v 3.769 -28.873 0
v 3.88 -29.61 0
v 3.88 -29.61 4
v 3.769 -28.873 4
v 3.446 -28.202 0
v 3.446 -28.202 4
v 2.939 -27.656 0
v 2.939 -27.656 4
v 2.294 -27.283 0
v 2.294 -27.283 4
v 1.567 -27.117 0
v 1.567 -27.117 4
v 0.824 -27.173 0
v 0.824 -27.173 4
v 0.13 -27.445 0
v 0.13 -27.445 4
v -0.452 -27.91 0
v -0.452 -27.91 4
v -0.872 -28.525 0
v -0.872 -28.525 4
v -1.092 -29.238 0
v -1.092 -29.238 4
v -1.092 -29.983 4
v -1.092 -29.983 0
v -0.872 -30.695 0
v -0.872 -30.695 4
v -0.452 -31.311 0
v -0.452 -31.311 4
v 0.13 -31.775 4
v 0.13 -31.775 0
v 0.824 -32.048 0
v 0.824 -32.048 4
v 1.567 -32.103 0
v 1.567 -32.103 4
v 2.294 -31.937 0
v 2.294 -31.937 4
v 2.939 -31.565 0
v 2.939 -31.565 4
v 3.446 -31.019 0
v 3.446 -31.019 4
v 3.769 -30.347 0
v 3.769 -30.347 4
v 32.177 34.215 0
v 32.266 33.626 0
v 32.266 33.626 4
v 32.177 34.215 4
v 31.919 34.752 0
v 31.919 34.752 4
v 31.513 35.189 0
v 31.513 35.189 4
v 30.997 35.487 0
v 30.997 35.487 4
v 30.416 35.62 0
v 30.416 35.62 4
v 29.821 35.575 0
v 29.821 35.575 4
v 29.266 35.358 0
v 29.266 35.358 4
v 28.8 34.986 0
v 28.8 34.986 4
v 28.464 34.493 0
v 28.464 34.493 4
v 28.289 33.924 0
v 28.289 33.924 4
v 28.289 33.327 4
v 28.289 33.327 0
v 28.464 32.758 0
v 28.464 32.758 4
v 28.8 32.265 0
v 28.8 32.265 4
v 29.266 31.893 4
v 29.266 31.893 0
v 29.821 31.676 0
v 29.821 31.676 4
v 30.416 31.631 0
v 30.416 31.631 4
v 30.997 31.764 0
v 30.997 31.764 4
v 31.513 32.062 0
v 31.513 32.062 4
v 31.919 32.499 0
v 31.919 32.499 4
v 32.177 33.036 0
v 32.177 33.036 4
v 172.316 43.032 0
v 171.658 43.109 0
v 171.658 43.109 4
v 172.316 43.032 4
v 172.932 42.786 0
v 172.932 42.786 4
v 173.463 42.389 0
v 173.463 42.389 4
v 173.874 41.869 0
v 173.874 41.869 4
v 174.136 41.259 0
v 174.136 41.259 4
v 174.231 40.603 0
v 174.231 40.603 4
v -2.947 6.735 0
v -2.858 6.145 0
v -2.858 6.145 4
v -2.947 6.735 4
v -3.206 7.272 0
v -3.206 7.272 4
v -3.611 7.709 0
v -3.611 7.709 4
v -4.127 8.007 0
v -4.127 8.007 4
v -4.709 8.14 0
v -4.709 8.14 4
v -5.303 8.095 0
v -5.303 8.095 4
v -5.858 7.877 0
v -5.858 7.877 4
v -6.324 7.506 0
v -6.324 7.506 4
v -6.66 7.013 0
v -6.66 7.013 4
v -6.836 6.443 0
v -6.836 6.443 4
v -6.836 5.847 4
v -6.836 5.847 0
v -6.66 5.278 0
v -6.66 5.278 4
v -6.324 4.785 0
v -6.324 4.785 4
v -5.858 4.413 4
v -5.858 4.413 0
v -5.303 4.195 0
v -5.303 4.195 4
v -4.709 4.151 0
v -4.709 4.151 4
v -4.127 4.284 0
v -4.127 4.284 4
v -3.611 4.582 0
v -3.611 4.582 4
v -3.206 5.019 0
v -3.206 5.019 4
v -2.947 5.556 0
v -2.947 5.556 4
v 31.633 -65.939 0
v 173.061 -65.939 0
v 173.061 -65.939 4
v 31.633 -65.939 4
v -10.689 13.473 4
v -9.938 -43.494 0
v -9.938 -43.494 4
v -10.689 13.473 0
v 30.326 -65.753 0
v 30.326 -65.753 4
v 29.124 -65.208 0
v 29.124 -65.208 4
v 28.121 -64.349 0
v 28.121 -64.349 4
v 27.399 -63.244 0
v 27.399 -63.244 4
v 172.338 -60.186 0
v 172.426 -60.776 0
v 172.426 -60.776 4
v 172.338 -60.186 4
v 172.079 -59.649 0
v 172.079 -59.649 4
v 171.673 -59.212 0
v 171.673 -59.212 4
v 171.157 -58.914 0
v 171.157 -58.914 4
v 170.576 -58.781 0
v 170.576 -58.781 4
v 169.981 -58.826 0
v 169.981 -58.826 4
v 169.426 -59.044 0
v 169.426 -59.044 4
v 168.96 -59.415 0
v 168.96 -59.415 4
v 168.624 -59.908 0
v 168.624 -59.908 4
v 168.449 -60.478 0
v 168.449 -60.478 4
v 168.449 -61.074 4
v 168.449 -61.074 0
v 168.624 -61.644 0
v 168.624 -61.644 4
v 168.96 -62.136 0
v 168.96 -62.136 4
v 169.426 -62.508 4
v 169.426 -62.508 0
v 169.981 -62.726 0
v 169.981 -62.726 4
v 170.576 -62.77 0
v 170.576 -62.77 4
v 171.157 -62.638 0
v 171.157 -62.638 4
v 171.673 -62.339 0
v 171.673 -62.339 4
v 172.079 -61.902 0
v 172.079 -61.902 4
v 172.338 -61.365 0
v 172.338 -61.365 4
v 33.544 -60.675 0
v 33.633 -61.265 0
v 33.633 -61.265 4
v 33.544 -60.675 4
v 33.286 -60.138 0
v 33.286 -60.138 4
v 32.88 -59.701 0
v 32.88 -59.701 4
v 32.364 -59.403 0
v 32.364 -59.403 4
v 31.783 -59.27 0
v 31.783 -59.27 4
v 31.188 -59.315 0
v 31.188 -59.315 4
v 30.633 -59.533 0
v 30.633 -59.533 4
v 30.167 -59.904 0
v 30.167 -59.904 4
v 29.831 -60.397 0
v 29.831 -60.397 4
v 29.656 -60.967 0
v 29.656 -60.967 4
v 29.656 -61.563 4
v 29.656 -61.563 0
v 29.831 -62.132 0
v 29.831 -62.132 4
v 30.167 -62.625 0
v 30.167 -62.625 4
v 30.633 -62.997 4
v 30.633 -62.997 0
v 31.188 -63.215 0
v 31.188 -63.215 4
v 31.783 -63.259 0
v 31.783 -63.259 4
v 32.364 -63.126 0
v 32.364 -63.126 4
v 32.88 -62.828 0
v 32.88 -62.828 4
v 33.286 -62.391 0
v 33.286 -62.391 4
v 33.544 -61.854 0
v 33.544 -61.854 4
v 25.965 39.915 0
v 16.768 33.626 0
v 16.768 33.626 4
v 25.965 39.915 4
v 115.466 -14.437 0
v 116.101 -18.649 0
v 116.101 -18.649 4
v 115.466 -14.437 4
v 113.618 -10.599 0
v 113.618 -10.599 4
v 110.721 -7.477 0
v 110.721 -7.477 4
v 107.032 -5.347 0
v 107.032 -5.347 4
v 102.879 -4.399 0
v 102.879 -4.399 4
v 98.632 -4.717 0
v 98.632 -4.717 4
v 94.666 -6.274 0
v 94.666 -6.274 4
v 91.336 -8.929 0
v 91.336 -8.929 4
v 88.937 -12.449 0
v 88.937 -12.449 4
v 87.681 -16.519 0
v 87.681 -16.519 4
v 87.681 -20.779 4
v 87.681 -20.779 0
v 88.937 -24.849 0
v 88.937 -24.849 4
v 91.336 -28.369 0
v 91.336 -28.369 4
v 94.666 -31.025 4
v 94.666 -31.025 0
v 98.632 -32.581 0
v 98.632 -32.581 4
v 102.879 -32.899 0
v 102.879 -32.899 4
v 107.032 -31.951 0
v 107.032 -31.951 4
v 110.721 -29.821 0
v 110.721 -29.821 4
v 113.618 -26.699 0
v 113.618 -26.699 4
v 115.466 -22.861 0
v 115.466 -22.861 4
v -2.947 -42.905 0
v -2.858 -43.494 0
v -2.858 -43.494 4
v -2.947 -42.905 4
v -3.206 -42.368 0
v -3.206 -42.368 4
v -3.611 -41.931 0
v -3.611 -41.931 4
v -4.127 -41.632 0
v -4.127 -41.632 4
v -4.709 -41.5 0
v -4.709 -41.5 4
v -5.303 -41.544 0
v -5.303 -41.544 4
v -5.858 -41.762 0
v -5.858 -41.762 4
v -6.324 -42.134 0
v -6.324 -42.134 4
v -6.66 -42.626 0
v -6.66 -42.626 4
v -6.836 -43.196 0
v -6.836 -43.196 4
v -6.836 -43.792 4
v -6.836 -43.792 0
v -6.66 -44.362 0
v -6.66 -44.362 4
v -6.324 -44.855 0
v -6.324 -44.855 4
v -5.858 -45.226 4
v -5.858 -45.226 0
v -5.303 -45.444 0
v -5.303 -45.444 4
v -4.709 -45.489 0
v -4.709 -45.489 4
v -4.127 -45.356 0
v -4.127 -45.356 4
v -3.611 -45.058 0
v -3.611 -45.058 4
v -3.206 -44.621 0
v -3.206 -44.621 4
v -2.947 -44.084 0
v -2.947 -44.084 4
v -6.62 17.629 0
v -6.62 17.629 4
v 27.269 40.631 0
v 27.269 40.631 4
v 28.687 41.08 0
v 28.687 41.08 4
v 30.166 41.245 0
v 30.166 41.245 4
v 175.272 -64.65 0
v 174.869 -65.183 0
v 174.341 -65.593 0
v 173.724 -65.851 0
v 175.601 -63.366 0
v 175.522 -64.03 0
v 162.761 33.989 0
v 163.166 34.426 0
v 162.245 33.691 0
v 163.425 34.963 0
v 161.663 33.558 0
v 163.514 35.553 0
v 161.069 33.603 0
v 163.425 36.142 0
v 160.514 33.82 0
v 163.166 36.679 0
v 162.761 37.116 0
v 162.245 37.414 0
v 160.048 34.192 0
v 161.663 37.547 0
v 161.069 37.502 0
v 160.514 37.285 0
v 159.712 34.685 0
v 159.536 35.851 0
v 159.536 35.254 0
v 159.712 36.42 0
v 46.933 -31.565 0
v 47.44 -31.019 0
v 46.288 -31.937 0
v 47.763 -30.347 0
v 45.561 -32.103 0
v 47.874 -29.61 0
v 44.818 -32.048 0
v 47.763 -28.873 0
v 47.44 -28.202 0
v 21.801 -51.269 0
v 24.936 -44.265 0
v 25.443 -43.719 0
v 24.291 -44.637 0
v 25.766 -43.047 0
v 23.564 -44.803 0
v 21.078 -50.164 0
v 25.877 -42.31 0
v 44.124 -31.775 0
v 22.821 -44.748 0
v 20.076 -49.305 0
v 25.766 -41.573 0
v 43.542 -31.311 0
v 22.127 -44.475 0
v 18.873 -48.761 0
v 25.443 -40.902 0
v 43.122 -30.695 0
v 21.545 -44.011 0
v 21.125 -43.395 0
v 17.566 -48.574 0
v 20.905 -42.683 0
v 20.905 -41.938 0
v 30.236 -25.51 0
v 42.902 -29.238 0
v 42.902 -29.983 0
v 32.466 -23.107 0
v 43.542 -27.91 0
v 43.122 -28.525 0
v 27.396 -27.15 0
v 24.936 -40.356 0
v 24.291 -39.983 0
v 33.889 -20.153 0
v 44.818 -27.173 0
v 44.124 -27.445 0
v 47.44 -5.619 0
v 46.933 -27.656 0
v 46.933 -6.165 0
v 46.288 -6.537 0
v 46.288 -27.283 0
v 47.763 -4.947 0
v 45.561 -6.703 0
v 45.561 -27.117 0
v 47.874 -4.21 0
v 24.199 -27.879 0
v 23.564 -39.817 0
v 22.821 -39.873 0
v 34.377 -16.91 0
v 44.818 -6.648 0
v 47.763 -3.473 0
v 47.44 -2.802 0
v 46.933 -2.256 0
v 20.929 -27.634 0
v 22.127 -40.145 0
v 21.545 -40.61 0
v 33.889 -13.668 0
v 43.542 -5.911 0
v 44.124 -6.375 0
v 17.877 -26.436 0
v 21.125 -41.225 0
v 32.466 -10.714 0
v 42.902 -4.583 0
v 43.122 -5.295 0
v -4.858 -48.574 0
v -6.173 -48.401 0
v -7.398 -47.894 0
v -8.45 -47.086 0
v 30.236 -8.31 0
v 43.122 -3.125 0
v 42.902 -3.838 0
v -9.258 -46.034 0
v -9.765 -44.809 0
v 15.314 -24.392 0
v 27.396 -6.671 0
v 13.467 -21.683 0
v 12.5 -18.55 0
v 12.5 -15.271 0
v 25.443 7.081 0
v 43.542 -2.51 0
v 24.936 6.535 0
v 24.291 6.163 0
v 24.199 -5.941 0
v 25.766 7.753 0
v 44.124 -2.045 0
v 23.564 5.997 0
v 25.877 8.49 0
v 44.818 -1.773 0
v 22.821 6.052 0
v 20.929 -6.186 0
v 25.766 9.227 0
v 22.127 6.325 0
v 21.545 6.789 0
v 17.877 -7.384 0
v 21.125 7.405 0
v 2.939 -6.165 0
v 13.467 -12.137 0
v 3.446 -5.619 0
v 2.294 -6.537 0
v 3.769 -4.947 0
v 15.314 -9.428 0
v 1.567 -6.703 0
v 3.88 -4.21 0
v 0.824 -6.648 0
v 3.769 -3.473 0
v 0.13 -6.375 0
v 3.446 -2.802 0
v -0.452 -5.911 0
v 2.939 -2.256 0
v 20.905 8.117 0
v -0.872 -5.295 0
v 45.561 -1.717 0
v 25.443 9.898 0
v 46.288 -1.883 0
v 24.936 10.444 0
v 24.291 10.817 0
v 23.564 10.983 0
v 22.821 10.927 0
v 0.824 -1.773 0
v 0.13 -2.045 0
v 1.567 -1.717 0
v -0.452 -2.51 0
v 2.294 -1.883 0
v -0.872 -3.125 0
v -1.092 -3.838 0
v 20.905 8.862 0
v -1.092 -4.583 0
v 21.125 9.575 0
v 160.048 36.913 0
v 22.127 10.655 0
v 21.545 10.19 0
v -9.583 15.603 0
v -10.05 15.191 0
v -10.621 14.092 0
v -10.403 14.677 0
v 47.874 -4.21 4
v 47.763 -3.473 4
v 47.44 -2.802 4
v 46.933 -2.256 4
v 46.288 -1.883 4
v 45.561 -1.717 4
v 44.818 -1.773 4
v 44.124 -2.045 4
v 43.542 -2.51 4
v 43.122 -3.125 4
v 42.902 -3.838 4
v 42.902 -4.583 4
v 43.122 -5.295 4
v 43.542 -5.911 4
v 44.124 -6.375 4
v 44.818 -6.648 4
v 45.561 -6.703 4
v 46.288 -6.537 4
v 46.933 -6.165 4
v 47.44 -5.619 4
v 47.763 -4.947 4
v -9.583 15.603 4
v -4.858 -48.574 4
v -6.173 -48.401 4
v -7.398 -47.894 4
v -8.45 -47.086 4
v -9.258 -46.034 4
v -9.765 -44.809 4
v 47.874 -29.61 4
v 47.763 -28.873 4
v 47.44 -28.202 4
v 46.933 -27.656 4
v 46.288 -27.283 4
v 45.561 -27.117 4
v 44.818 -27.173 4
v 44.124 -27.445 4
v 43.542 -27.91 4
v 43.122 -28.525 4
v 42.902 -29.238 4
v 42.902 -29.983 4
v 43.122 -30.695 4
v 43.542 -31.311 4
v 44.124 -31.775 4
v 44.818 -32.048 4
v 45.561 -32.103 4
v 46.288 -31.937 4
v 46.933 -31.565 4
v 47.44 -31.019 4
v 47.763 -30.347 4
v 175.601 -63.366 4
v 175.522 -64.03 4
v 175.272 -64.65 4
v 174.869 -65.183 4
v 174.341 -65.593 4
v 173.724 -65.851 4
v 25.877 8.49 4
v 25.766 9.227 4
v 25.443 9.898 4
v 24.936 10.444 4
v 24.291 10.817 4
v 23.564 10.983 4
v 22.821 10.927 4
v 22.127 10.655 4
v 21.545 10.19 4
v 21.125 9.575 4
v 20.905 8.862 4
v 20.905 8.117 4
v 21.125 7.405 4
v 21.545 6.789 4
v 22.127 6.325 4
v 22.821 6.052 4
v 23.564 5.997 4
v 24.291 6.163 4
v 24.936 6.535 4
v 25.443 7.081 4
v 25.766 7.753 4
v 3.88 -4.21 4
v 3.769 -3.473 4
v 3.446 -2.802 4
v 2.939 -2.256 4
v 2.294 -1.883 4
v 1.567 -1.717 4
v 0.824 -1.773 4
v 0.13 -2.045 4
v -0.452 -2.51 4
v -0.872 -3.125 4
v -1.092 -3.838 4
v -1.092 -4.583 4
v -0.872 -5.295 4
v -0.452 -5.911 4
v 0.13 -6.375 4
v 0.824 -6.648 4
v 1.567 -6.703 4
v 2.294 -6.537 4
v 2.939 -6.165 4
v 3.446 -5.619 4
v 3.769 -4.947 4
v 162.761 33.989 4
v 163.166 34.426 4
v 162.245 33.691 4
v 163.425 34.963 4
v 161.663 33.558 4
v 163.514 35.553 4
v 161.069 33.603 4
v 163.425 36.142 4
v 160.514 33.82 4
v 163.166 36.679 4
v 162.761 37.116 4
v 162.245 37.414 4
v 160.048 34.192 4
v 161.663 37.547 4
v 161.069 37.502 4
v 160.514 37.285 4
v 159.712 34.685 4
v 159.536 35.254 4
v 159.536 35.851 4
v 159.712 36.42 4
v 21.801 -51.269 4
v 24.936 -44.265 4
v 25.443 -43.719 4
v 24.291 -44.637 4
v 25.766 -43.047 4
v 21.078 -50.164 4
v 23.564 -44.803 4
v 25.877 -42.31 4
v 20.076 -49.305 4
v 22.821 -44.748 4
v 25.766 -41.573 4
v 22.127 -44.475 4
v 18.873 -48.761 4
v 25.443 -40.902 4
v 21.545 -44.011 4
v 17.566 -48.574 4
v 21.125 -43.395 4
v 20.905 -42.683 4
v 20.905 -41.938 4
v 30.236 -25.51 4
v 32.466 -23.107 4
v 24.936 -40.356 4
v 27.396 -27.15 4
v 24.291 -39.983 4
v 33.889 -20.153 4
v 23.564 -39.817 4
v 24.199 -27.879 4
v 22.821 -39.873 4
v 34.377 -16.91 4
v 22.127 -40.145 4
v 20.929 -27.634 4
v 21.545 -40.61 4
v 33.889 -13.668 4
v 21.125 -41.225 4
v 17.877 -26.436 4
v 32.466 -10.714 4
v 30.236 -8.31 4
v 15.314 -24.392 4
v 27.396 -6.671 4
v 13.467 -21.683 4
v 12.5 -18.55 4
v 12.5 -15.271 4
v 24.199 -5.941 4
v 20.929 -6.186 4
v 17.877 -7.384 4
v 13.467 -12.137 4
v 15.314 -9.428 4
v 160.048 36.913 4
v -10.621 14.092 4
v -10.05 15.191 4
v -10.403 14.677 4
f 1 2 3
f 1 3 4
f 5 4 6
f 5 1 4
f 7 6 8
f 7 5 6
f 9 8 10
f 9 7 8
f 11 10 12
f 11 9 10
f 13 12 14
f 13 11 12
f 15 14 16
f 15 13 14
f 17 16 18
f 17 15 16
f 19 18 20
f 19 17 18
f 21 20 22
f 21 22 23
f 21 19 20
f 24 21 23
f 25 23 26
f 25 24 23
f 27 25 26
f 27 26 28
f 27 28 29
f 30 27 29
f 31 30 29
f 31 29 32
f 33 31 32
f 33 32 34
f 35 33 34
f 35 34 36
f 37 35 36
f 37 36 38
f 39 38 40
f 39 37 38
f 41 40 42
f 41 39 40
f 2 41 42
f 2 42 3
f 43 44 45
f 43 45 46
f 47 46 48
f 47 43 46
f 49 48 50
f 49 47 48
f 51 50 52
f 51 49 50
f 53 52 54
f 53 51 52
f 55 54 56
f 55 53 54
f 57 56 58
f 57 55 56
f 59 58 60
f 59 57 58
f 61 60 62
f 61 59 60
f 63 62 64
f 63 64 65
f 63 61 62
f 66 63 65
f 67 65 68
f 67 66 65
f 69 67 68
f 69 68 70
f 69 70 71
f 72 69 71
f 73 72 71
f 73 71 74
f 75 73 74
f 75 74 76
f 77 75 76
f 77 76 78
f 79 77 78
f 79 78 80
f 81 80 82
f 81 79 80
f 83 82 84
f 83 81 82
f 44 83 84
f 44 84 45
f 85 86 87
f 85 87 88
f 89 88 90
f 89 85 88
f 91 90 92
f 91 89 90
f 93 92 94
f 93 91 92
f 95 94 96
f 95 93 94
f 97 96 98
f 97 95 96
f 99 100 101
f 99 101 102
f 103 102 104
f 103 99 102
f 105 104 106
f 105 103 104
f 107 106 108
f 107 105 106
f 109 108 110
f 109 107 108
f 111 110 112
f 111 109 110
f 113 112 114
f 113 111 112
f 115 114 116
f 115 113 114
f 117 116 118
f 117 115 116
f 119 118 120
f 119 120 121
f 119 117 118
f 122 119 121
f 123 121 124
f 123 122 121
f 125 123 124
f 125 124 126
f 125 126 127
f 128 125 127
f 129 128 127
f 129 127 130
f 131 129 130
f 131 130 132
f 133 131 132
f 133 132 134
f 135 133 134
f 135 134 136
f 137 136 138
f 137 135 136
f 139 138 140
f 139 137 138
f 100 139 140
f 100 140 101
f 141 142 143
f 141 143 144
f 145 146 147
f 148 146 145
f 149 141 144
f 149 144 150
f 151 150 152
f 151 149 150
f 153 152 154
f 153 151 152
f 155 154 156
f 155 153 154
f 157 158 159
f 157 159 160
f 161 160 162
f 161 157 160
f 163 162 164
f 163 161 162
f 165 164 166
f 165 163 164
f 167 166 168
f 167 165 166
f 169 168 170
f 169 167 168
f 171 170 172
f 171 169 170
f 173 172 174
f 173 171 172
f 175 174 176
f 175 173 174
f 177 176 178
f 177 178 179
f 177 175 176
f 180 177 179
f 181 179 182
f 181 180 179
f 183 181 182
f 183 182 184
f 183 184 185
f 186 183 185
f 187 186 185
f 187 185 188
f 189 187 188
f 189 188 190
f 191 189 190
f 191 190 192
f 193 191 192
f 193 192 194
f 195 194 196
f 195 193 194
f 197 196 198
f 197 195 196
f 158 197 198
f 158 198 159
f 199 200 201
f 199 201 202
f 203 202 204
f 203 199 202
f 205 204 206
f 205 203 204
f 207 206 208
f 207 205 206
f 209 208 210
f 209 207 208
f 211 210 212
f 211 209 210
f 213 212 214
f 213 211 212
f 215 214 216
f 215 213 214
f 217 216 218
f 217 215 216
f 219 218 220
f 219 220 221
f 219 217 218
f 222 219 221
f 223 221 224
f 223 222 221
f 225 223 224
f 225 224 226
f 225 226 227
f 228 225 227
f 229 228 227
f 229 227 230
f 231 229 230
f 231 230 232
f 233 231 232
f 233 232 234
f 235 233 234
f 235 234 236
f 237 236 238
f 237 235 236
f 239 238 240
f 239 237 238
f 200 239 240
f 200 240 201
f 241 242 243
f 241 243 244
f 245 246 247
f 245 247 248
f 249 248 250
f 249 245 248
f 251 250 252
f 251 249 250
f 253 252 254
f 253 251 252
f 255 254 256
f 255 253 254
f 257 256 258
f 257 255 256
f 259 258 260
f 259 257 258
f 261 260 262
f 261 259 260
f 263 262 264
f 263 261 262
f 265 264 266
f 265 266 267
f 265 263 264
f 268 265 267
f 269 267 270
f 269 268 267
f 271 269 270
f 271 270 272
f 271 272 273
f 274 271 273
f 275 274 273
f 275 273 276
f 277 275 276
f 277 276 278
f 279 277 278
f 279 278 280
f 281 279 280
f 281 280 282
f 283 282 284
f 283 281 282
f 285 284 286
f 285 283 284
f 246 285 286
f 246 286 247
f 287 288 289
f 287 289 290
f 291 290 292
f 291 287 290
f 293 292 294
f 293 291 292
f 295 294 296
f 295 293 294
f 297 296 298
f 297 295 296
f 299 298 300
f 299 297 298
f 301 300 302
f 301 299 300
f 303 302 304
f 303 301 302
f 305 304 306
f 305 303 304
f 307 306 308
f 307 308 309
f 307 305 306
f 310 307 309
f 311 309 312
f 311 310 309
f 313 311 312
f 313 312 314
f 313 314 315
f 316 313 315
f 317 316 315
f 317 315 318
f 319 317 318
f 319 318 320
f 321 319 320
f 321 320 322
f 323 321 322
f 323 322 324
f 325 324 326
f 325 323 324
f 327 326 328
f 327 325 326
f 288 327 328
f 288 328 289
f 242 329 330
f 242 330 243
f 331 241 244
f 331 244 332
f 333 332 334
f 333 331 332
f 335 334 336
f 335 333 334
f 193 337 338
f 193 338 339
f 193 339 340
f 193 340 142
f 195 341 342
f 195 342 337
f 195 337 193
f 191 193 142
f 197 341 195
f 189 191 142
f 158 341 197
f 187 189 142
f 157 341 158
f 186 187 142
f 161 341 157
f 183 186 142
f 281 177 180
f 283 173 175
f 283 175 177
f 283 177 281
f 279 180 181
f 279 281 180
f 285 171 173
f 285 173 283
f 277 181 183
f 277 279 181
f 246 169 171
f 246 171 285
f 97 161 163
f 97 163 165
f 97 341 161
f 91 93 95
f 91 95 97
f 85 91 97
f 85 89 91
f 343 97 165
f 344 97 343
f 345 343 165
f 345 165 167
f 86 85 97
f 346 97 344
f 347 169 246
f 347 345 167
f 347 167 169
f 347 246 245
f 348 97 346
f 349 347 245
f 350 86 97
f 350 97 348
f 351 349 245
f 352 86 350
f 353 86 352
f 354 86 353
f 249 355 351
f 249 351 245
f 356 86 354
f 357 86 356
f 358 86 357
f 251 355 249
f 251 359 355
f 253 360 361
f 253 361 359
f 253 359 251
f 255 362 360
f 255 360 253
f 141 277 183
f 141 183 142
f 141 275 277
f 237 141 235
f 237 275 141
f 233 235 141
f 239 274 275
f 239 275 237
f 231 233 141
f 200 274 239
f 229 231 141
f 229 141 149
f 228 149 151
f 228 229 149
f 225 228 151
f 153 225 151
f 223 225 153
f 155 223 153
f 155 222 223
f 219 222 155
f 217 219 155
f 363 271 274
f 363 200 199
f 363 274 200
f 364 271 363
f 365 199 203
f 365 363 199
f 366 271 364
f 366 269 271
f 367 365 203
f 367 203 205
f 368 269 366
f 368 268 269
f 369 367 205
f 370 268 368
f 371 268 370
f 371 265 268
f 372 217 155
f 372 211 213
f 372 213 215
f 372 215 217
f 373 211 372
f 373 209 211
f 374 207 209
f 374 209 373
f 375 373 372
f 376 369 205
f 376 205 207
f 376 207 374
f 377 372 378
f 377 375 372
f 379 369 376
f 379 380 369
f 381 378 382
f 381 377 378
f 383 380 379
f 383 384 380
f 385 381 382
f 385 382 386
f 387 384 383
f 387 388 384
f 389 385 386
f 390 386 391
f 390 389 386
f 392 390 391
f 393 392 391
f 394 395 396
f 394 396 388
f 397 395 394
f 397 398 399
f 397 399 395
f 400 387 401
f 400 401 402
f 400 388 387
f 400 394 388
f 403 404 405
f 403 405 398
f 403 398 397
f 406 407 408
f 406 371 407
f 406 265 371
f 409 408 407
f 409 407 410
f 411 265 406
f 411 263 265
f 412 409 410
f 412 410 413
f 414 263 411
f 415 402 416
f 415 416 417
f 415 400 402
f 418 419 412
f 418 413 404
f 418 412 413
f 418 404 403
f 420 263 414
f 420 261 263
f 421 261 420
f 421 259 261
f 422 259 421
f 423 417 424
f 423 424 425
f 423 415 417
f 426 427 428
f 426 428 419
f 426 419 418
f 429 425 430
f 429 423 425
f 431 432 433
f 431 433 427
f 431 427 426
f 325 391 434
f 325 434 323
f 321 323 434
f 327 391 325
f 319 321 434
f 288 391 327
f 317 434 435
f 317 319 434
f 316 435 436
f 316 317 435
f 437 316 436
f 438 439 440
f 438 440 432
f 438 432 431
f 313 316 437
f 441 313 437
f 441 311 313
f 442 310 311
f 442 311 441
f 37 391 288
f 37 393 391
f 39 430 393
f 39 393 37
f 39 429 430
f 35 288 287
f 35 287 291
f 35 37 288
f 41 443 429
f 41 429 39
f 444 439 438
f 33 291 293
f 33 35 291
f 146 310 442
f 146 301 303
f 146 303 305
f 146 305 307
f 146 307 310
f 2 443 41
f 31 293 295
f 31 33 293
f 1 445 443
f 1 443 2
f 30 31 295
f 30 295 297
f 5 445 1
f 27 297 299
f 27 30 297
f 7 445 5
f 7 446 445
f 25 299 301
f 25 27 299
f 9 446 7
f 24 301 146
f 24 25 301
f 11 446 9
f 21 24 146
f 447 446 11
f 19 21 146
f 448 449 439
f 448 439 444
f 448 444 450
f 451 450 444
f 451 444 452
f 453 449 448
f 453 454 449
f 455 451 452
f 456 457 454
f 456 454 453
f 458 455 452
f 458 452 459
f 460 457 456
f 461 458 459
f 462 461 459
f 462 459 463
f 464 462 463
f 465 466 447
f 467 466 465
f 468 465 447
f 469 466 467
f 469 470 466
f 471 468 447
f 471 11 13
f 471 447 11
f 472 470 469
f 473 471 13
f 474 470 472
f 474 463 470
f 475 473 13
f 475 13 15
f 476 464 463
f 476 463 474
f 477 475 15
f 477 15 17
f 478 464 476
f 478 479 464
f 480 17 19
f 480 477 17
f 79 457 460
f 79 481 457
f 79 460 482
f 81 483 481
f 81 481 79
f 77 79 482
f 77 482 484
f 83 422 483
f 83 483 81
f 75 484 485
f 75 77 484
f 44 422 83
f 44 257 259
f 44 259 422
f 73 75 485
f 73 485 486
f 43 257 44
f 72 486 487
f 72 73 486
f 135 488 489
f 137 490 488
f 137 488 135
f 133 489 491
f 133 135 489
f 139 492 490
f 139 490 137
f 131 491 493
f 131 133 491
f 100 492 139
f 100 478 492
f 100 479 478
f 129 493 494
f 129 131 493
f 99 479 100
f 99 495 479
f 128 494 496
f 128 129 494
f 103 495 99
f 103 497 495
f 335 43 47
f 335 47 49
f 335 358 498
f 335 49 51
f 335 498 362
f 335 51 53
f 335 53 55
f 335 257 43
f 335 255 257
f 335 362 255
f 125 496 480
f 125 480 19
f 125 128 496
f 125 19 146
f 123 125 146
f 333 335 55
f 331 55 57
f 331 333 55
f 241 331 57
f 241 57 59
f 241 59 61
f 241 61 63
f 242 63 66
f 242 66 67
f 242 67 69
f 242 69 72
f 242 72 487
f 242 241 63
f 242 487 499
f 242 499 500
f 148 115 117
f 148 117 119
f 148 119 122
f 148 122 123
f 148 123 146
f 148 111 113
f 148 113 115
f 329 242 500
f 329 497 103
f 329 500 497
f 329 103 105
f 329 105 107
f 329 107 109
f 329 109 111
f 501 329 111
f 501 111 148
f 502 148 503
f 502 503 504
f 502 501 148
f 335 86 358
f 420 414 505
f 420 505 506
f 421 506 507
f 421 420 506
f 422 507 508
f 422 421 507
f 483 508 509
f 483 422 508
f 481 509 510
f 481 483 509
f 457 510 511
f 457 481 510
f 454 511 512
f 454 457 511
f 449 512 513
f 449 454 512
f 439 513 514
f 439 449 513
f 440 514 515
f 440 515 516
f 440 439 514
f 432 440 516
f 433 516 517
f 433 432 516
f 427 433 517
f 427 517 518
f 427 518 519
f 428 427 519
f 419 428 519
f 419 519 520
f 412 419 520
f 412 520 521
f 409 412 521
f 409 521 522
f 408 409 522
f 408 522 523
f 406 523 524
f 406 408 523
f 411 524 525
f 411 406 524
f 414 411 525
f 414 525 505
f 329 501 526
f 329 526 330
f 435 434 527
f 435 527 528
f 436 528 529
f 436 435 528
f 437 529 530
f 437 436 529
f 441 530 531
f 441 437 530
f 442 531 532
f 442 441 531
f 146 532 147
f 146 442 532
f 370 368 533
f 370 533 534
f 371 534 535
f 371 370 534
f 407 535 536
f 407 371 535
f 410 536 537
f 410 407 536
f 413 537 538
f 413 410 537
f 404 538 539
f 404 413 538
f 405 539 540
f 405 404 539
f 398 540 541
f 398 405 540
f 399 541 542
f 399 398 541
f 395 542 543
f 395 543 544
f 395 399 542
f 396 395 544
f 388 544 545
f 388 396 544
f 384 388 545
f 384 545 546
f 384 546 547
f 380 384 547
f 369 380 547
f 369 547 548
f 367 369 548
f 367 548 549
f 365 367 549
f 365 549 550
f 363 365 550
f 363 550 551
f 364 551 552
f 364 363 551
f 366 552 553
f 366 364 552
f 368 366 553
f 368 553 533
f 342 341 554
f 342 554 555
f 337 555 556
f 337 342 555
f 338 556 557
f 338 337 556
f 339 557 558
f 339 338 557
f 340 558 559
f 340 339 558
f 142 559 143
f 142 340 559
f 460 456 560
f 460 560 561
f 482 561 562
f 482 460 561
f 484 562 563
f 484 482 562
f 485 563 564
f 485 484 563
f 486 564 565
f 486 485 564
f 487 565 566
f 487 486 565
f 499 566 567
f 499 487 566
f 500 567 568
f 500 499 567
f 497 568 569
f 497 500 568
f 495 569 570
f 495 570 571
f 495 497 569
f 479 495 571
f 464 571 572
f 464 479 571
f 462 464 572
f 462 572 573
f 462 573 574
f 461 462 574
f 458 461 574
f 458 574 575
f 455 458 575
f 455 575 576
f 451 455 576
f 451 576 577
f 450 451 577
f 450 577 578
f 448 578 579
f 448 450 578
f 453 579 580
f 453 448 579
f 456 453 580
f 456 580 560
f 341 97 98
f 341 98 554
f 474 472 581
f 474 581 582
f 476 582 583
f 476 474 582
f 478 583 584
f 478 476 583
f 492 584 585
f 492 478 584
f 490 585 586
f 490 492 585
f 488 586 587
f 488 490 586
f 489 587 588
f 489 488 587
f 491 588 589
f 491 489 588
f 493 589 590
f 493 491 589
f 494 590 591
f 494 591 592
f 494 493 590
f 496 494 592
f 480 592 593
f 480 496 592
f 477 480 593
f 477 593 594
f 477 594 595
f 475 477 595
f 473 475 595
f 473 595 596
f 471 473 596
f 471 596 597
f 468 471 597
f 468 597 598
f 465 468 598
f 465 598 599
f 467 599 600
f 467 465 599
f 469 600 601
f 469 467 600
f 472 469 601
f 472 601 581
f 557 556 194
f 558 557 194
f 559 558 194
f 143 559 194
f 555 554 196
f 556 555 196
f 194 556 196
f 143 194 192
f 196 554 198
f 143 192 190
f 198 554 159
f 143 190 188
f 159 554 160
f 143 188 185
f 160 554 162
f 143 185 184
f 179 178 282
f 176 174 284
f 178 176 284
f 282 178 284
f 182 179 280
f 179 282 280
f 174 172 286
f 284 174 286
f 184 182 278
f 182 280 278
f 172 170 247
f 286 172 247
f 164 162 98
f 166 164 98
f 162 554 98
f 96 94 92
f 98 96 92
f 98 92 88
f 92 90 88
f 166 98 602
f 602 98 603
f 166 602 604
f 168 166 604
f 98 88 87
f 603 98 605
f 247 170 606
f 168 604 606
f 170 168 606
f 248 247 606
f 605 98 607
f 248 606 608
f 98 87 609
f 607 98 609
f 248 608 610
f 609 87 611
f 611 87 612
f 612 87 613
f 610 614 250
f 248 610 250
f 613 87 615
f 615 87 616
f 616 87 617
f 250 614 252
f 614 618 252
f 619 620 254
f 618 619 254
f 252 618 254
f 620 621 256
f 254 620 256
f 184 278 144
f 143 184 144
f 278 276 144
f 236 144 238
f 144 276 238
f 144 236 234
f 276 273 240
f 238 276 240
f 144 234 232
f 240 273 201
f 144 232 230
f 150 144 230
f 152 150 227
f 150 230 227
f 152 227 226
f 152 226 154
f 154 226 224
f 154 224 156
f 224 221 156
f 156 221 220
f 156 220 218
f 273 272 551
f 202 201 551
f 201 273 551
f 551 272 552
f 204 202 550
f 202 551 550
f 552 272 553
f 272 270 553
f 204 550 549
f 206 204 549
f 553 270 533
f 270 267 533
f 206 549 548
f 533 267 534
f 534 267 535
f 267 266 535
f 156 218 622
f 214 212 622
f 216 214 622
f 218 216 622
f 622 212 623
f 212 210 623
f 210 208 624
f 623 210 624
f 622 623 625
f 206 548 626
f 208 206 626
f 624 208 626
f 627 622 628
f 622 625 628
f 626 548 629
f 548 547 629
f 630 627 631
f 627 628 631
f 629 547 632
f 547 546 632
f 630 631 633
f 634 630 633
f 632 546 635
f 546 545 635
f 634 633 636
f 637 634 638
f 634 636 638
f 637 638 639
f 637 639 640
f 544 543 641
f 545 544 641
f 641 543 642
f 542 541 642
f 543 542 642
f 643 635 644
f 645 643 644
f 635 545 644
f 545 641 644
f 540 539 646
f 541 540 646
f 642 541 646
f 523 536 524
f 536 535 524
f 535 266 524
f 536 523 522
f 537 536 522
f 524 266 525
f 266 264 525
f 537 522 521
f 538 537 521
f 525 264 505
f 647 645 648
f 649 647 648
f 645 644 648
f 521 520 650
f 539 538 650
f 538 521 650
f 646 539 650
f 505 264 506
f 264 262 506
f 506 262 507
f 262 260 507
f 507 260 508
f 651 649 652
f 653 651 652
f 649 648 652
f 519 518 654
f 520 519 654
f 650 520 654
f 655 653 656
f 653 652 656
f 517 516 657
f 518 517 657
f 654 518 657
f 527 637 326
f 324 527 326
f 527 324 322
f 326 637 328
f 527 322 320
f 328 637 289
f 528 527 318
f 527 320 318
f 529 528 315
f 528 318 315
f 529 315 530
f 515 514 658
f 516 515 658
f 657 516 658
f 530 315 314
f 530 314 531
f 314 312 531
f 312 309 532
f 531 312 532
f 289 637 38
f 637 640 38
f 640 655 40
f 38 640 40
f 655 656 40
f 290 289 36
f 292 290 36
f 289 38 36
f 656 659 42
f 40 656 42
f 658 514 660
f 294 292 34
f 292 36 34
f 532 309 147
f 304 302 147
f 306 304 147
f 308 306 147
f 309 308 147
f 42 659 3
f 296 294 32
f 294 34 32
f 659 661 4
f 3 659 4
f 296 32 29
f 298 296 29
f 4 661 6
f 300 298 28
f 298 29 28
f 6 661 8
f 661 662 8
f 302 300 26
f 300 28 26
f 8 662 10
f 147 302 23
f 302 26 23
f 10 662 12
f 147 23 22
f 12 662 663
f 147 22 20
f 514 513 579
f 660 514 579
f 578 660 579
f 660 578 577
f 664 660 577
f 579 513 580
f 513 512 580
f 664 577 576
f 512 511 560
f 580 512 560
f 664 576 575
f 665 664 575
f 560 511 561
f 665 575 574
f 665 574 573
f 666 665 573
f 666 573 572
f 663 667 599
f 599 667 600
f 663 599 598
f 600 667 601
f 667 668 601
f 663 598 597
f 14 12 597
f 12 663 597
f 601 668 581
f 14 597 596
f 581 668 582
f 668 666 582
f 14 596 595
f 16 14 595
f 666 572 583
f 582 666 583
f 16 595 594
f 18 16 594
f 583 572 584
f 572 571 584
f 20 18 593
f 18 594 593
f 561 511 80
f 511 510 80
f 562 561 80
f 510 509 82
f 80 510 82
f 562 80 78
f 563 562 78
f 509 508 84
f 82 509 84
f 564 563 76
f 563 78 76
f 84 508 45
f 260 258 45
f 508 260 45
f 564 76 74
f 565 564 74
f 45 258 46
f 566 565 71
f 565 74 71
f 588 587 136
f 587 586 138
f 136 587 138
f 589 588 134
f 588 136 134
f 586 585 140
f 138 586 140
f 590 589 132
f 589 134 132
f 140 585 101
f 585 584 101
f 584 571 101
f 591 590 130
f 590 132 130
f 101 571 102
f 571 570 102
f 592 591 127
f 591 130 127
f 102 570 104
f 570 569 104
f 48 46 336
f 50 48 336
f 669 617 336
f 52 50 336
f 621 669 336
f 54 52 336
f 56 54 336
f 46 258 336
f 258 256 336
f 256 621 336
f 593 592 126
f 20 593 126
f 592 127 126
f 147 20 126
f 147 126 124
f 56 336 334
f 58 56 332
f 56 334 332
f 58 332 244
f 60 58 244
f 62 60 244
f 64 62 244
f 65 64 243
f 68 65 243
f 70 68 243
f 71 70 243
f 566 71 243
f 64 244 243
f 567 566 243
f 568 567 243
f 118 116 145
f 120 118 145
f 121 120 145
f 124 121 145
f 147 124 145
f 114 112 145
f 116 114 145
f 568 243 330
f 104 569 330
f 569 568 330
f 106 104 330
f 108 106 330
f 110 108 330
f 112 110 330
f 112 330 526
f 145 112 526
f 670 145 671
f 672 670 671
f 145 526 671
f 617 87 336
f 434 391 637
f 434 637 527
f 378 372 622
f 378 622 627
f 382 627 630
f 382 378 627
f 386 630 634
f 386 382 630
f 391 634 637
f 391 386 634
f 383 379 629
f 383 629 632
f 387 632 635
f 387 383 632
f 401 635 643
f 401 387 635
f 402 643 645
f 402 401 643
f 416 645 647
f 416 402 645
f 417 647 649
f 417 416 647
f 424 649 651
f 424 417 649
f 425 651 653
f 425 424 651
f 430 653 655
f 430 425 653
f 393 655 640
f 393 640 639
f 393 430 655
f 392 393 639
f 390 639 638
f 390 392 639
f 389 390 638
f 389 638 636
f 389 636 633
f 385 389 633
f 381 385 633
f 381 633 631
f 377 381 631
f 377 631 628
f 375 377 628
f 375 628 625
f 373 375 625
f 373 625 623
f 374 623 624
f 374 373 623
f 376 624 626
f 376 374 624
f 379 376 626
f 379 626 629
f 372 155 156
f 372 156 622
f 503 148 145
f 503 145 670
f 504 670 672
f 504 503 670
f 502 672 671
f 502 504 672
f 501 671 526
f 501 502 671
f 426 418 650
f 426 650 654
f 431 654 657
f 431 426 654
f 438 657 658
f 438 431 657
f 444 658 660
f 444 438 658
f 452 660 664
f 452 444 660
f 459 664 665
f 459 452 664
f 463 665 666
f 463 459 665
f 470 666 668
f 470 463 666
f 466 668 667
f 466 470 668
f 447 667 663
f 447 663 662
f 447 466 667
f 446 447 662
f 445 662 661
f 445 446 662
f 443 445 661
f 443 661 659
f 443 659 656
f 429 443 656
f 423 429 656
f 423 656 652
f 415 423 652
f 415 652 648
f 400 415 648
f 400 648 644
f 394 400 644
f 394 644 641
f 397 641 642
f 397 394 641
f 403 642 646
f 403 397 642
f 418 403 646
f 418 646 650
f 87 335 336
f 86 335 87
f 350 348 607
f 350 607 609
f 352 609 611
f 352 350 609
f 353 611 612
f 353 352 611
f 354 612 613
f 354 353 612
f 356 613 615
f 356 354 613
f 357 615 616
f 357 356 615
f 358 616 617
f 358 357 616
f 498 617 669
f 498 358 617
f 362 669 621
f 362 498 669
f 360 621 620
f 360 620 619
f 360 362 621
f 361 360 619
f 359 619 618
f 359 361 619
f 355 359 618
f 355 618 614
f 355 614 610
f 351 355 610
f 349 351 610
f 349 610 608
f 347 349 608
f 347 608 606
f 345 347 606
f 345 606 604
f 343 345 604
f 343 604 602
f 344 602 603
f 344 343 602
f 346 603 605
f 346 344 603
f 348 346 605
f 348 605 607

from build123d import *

# Parameters (mm, degrees)
SKETCH1_R           = 2
SKETCH1_R_2         = 14.29
SKETCH1_R_3         = 2.499999953
SKETCH1_R_4         = 11
BOSS_EXTRUDE1_DEPTH = 4


with BuildPart() as part:
    # Sketch1 → Boss-Extrude1 (new body)
    with BuildSketch(Plane.XY):
        with BuildLine():
            Line((17.566132686, -48.57422294), (-4.85811184, -48.57422294))
            ThreePointArc((-4.85811184, -48.57422294), (-8.450214288, -47.086325388), (-9.93811184, -43.49422294))
            Line((-9.93811184, -43.49422294), (-10.688835244, 13.472862597))
            ThreePointArc((-10.688835244, 13.472862597), (-10.403338368, 14.676721118), (-9.582963432, 15.602879187))
            Line((-9.582963432, 15.602879187), (-6.619834827, 17.62947485))
            Line((-6.619834827, 17.62947485), (16.768305704, 33.625508255))
            Line((16.768305704, 33.625508255), (25.964523002, 39.915148892))
            ThreePointArc((25.964523002, 39.915148892), (27.966960045, 40.890333383), (30.165836856, 41.244846678))
            Line((30.165836856, 41.244846678), (171.657580351, 43.10945257))
            ThreePointArc((171.657580351, 43.10945257), (173.463278691, 42.389235045), (174.230829536, 40.603142807))
            Line((174.230829536, 40.603142807), (175.600950315, -63.36562536))
            ThreePointArc((175.600950315, -63.36562536), (174.869016667, -65.183273725), (173.061170841, -65.939095071))
            Line((173.061170841, -65.939095071), (66.523565599, -65.939095071))
            Line((66.523565599, -65.939095071), (31.633252021, -65.939095071))
            ThreePointArc((31.633252021, -65.939095071), (29.123552435, -65.208231246), (27.398652648, -63.244185761))
            Line((27.398652648, -63.244185761), (21.800732059, -51.26913225))
            ThreePointArc((21.800732059, -51.26913225), (20.075832272, -49.305086766), (17.566132686, -48.57422294))
        make_face()
        with Locations((-4.85811184, -43.49422294)):
            Circle(SKETCH1_R, mode=Mode.SUBTRACT)
        with Locations((101.811349412, -18.649052962)):
            Circle(SKETCH1_R_2, mode=Mode.SUBTRACT)
        with Locations((31.633252021, -61.264657987)):
            Circle(SKETCH1_R, mode=Mode.SUBTRACT)
        with Locations((30.266245989, 33.625508255)):
            Circle(SKETCH1_R, mode=Mode.SUBTRACT)
        with Locations((170.426367515, -60.775756941)):
            Circle(SKETCH1_R, mode=Mode.SUBTRACT)
        with Locations((161.513898191, 35.55251649)):
            Circle(SKETCH1_R, mode=Mode.SUBTRACT)
        with Locations((-4.85811184, 6.145317428)):
            Circle(SKETCH1_R, mode=Mode.SUBTRACT)
        with Locations((23.377209906, -42.310207828)):
            Circle(SKETCH1_R_3, mode=Mode.SUBTRACT)
        with Locations((23.377209906, -16.910207828)):
            Circle(SKETCH1_R_4, mode=Mode.SUBTRACT)
        with Locations((1.38016465, -29.610207828)):
            Circle(SKETCH1_R_3, mode=Mode.SUBTRACT)
        with Locations((1.38016465, -4.210207828)):
            Circle(SKETCH1_R_3, mode=Mode.SUBTRACT)
        with Locations((23.377209906, 8.489792172)):
            Circle(SKETCH1_R_3, mode=Mode.SUBTRACT)
        with Locations((45.374255162, -4.210207828)):
            Circle(SKETCH1_R_3, mode=Mode.SUBTRACT)
        with Locations((45.374255162, -29.610207828)):
            Circle(SKETCH1_R_3, mode=Mode.SUBTRACT)
    extrude(amount=BOSS_EXTRUDE1_DEPTH)


solid = part.part
